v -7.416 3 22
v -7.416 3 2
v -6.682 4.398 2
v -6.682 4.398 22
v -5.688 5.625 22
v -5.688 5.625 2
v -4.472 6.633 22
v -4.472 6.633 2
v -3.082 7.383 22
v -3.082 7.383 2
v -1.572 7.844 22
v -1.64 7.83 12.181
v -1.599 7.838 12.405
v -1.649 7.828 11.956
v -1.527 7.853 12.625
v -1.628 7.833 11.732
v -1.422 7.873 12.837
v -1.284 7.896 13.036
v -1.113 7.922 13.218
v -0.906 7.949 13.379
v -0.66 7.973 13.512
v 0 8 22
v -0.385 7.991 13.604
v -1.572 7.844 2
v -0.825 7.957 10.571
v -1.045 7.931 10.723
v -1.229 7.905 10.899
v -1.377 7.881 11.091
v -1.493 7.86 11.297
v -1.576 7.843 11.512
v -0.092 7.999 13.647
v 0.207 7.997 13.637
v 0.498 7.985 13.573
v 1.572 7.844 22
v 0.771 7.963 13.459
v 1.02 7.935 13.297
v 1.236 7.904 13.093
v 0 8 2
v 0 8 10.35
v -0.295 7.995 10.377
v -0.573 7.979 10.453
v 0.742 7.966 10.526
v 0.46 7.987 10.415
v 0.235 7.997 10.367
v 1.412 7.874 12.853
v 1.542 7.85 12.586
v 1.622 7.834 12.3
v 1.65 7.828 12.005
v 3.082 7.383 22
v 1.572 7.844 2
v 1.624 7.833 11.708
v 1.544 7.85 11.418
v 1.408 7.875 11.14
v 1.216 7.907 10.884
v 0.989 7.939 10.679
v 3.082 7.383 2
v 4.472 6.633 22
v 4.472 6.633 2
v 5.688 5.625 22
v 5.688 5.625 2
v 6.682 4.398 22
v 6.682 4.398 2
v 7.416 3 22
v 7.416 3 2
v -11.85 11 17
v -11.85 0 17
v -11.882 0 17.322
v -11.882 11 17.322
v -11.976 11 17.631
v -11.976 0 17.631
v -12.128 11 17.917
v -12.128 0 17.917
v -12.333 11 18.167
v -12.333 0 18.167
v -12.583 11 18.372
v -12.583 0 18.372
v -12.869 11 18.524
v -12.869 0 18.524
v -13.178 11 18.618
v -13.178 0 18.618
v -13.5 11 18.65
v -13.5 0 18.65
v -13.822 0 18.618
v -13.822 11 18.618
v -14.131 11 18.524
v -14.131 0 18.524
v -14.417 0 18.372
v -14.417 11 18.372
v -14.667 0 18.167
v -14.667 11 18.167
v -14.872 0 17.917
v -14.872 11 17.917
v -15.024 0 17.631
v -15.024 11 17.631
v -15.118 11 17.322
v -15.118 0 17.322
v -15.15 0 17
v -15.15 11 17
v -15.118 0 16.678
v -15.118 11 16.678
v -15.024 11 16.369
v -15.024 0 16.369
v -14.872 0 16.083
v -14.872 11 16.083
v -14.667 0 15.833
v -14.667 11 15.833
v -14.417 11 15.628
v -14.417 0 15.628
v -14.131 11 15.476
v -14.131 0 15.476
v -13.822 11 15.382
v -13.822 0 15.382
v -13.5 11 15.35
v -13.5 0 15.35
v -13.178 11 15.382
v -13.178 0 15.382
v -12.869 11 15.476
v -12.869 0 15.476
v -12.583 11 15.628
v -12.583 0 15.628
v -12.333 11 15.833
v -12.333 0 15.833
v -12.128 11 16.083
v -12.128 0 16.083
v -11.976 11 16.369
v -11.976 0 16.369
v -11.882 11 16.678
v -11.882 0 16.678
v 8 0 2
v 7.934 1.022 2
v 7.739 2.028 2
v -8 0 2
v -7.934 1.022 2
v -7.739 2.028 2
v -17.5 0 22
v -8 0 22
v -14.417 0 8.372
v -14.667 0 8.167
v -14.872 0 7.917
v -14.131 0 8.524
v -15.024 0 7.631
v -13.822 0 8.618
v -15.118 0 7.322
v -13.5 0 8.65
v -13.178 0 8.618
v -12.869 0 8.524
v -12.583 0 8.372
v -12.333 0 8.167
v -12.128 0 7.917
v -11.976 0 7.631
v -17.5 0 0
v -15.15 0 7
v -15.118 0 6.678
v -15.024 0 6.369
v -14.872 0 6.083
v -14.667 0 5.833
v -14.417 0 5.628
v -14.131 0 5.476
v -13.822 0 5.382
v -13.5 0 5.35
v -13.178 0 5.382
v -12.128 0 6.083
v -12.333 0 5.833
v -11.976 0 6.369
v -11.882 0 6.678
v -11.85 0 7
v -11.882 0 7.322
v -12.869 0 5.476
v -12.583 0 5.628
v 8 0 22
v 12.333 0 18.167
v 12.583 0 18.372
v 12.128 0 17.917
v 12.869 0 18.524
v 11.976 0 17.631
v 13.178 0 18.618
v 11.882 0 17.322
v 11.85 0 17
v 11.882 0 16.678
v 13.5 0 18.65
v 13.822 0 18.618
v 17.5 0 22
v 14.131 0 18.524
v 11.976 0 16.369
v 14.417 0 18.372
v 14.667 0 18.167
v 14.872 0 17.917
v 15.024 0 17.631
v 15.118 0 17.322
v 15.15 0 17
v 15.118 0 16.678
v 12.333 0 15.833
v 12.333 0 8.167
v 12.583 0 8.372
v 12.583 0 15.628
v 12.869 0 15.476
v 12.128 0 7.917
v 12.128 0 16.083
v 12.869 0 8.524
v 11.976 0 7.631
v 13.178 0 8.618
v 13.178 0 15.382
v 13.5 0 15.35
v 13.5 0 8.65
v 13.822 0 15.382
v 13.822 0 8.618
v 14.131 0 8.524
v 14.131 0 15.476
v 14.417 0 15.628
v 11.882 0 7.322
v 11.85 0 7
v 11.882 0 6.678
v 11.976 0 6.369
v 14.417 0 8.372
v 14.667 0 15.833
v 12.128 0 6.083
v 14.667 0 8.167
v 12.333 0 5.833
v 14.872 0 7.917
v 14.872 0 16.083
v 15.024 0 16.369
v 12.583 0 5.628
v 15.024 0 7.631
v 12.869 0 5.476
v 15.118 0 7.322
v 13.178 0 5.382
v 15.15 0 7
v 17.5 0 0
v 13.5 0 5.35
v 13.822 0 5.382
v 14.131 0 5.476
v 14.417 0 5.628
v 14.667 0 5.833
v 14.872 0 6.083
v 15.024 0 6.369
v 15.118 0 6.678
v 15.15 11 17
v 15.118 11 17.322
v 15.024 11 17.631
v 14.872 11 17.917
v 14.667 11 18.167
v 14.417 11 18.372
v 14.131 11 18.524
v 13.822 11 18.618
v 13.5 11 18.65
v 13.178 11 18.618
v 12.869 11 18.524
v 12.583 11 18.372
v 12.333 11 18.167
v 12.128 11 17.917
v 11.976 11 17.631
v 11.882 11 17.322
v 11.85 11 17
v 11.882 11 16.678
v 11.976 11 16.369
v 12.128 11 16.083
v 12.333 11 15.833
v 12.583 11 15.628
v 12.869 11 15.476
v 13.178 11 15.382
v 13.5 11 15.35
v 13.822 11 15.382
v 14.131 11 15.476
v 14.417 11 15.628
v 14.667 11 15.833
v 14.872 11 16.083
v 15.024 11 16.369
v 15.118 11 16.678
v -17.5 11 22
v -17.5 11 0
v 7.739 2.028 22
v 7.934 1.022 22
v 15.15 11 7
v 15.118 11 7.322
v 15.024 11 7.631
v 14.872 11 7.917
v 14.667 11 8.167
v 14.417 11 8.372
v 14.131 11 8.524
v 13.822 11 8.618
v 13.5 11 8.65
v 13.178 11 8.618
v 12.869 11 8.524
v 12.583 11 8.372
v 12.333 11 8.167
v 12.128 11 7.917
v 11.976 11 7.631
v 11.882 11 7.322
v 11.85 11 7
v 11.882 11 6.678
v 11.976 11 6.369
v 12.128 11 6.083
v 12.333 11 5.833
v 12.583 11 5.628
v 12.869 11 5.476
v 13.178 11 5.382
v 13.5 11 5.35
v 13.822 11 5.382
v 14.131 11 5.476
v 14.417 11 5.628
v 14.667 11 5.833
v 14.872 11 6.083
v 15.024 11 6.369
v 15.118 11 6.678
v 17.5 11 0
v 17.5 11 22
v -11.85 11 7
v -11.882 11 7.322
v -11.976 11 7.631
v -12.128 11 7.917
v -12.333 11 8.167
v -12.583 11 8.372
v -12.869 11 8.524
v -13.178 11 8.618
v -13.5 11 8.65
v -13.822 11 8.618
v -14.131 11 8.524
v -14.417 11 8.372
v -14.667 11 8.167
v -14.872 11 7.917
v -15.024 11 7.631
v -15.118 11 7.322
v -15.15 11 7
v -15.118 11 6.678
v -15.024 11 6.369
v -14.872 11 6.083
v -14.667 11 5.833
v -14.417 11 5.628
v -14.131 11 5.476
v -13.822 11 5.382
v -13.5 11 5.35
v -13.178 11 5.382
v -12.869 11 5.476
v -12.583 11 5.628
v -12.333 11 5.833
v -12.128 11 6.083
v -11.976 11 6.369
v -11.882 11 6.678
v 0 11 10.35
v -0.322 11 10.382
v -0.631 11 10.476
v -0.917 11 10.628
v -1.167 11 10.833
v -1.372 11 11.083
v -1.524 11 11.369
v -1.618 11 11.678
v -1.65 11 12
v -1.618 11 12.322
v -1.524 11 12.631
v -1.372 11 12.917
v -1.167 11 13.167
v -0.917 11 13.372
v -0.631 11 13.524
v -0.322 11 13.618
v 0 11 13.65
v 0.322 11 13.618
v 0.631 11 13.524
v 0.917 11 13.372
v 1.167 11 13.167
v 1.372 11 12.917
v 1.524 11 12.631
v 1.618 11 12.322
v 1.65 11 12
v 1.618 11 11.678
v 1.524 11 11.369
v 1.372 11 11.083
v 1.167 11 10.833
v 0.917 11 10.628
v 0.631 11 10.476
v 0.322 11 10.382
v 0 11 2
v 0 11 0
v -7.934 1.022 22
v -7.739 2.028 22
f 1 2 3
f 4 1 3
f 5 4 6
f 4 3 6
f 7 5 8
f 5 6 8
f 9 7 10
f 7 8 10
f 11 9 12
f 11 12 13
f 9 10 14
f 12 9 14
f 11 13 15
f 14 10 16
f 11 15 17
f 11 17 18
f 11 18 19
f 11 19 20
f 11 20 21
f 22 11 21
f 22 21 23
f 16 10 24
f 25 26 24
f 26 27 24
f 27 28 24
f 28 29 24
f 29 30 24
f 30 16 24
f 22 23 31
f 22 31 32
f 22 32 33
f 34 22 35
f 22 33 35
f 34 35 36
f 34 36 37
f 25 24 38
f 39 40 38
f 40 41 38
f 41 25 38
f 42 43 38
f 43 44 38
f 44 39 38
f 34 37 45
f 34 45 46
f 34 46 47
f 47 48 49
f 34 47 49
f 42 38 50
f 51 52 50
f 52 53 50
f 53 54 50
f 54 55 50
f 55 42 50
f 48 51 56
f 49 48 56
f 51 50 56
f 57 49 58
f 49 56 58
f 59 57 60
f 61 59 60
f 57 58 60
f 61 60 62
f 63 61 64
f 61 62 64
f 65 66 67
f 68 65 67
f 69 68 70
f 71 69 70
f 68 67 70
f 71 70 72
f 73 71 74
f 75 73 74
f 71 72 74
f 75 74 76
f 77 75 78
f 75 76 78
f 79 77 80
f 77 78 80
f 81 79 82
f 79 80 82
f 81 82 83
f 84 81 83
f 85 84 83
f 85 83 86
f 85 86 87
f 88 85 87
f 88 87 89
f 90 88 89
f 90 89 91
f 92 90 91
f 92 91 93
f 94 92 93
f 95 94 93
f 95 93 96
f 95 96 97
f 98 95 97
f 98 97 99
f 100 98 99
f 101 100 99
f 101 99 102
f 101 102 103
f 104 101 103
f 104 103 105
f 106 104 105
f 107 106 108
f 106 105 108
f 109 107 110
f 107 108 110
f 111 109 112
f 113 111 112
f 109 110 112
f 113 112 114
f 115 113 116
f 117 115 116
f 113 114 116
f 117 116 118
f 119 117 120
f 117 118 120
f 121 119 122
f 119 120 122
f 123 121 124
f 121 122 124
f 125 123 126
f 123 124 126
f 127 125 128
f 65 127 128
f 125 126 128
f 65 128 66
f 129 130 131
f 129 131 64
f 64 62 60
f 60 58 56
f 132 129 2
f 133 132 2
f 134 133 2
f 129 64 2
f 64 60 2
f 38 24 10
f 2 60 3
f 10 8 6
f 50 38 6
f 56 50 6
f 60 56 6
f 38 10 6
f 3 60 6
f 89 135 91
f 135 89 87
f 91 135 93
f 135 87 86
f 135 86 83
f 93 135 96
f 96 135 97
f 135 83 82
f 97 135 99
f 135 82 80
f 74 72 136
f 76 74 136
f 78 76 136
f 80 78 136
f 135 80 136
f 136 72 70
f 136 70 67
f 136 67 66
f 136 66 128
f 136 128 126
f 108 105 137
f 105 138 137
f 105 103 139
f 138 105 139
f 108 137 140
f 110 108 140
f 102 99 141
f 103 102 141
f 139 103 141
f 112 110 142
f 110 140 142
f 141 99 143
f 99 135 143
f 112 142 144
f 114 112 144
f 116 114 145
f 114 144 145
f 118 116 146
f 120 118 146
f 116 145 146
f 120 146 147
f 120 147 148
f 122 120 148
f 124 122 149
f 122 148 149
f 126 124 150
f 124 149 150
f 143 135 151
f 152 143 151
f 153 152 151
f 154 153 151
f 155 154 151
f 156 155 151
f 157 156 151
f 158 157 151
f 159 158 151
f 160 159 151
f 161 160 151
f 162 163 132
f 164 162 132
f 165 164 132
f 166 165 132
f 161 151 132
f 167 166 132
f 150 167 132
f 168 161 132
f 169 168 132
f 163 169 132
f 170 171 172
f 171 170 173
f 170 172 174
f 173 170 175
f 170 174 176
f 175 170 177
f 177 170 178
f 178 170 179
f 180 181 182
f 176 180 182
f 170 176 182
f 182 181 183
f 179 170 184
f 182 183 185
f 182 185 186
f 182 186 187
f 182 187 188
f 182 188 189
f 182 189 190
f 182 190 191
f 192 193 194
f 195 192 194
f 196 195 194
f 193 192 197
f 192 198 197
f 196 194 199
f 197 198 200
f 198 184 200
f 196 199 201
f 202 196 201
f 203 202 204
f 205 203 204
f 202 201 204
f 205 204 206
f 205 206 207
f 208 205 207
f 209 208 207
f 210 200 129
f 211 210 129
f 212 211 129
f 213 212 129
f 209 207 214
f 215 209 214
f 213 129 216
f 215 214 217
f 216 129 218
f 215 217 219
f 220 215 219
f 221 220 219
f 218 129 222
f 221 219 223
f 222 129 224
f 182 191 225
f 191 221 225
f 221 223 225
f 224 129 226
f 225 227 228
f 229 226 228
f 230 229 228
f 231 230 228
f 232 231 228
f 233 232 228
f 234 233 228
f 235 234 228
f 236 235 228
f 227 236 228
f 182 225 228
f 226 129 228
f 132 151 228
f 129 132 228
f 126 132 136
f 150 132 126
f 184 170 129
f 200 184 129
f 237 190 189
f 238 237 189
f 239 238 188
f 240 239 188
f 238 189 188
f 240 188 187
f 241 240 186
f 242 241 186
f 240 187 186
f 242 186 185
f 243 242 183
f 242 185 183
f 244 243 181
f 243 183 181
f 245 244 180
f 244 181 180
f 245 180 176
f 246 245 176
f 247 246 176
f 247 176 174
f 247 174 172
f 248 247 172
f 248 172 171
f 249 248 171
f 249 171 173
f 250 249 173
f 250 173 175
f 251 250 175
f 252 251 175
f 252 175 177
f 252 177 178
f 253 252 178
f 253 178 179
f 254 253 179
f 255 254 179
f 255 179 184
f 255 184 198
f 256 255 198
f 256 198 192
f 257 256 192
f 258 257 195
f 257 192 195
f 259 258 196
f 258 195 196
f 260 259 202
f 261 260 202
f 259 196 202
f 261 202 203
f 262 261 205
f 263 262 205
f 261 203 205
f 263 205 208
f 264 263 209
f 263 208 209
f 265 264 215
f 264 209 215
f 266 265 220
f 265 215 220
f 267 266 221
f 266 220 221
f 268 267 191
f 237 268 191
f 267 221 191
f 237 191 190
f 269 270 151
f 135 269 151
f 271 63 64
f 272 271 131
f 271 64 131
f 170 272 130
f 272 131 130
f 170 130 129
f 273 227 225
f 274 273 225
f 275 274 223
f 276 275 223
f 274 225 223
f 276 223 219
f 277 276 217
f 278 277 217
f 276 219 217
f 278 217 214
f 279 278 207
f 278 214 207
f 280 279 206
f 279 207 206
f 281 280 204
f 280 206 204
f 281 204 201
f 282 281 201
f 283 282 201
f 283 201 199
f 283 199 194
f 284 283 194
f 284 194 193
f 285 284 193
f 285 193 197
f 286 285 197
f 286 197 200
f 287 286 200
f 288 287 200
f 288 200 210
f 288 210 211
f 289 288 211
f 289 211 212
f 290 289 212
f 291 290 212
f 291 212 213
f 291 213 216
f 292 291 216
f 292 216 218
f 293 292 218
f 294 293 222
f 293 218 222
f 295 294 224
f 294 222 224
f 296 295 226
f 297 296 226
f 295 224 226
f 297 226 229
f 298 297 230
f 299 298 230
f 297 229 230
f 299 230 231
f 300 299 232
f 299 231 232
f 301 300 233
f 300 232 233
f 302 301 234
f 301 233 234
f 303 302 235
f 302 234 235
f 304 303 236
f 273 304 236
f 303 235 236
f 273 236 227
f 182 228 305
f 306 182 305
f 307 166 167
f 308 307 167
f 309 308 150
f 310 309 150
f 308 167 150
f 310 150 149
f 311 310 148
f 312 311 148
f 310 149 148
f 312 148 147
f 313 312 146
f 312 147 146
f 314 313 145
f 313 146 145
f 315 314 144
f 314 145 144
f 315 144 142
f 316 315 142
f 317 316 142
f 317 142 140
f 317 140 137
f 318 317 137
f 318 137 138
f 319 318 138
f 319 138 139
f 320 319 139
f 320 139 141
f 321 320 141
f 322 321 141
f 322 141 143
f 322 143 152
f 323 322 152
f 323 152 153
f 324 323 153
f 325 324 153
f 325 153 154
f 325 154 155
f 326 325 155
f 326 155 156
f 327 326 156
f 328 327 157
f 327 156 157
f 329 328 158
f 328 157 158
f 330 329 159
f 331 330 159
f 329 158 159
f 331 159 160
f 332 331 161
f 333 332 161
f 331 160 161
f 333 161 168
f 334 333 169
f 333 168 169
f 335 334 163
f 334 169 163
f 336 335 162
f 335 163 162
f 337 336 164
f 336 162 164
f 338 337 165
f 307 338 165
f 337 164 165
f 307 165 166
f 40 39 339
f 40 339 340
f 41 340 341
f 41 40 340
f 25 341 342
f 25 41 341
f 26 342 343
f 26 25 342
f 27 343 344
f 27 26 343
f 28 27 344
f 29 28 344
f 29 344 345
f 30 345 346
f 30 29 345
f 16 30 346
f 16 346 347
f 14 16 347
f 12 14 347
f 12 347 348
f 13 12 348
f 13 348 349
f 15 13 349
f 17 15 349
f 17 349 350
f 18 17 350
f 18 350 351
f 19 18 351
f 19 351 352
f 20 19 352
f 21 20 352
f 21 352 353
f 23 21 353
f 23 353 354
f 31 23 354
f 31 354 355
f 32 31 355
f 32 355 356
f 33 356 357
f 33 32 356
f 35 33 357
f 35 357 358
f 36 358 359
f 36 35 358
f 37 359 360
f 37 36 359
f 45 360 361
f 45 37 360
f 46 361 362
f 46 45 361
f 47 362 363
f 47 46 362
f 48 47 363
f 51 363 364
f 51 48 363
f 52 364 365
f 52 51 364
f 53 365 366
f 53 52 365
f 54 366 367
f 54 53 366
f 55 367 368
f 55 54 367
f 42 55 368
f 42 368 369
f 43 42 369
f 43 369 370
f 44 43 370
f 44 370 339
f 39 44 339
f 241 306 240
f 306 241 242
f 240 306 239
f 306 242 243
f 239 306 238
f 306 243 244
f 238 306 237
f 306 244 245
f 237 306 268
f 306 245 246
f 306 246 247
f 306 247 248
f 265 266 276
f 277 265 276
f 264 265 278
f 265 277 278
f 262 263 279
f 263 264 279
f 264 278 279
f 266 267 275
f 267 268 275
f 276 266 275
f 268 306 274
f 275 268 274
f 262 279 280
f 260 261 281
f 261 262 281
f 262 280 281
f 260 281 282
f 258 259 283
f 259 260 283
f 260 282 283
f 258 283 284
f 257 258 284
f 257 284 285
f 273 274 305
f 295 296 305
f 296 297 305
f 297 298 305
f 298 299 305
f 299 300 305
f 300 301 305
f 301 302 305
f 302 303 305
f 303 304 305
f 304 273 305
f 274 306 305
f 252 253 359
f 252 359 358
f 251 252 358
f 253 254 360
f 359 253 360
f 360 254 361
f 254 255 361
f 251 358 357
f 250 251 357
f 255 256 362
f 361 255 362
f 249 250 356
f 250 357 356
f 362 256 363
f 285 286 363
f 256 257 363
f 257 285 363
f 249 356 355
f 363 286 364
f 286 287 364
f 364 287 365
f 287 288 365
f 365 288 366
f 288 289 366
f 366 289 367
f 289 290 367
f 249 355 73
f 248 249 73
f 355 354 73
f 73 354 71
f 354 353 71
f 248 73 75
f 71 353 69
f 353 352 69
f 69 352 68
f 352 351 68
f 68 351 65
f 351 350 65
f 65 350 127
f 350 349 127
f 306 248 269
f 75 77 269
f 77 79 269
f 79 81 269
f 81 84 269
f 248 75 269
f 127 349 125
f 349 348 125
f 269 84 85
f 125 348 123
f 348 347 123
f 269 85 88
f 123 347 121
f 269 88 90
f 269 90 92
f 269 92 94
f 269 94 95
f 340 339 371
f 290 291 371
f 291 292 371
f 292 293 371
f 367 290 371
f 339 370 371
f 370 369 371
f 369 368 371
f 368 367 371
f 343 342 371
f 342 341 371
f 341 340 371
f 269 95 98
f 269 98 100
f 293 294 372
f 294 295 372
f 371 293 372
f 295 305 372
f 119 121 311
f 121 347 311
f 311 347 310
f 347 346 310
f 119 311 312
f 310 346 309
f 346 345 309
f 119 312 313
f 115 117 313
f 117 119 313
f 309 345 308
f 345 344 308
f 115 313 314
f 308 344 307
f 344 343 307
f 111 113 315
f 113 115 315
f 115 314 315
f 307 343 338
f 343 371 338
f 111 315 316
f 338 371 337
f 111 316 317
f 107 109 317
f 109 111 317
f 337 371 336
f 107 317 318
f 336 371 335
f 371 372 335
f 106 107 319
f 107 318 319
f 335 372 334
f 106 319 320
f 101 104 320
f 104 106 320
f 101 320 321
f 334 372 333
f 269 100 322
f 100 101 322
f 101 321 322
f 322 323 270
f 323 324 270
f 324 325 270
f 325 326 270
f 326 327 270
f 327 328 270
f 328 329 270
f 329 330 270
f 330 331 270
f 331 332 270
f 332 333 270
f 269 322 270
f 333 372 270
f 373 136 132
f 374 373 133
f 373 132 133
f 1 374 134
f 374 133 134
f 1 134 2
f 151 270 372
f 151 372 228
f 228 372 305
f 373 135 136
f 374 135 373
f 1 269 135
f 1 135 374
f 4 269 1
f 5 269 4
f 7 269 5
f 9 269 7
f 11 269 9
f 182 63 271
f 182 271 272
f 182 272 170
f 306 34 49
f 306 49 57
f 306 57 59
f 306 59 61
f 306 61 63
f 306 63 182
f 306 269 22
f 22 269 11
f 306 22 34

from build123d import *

# Parameters (mm, degrees)
EXTRUDE_1_DEPTH     = 22
SKETCH_3_R          = 1.65
CUT_EXTRUDE_2_DEPTH = 19
EXTRUDE_2_DEPTH     = 2
SKETCH_5_R          = 1.65
CUT_EXTRUDE_3_DEPTH = 31.186917806


with BuildPart() as part:
    # 草图1 → 凸台-拉伸1 (new body)
    with BuildSketch(Plane.XY):
        with BuildLine():
            Line((-10.583005244, 3), (-17.5, 3))
            Line((-17.5, 3), (-17.5, 0))
            Line((-17.5, 0), (-11, 0))
            ThreePointArc((-11, 0), (-10.895252583, 1.514421063), (-10.583005244, 3))
        make_face()
        with BuildLine():
            Line((-7.416198487, 3), (-10.583005244, 3))
            ThreePointArc((-10.583005244, 3), (-10.895252583, 1.514421063), (-11, 0))
            Line((-11, 0), (-8, 0))
            ThreePointArc((-8, 0), (-7.85269342, 1.5281381), (-7.416198487, 3))
        make_face()
        with BuildLine():
            ThreePointArc((11, 0), (10.895252583, 1.514421063), (10.583005244, 3))
            Line((10.583005244, 3), (7.416198487, 3))
            ThreePointArc((7.416198487, 3), (7.85269342, 1.5281381), (8, 0))
            Line((8, 0), (11, 0))
        make_face()
        with BuildLine():
            ThreePointArc((-4.5e-08, 11), (-6.633249599, 8.774964374), (-10.583005244, 3))
            Line((-10.583005244, 3), (-7.416198487, 3))
            ThreePointArc((-7.416198487, 3), (0, 8), (7.416198487, 3))
            Line((7.416198487, 3), (10.583005244, 3))
            ThreePointArc((10.583005244, 3), (6.633249563, 8.774964401), (-4.5e-08, 11))
        make_face()
        with BuildLine():
            Line((17.5, 3), (10.583005244, 3))
            ThreePointArc((10.583005244, 3), (10.895252583, 1.514421063), (11, 0))
            Line((11, 0), (17.5, 0))
            Line((17.5, 0), (17.5, 3))
        make_face()
        with BuildLine():
            Line((-17.5, 11), (-17.5, 3))
            Line((-17.5, 3), (-10.583005244, 3))
            ThreePointArc((-10.583005244, 3), (-6.633249599, 8.774964374), (-4.5e-08, 11))
            Line((-4.5e-08, 11), (-17.5, 11))
        make_face()
        with BuildLine():
            Line((17.5, 11), (-4.5e-08, 11))
            ThreePointArc((-4.5e-08, 11), (6.633249563, 8.774964401), (10.583005244, 3))
            Line((10.583005244, 3), (17.5, 3))
            Line((17.5, 3), (17.5, 11))
        make_face()
    extrude(amount=EXTRUDE_1_DEPTH)

    # 草图3 → 切除-拉伸2 (cut)
    with BuildSketch(Plane(origin=(0, 0, 0), x_dir=(1, 0, 0), z_dir=(0, 1, 0))):
        with Locations(Location((0, -12, 0), (0, 0, 90))):
            Circle(SKETCH_3_R)
    extrude(amount=CUT_EXTRUDE_2_DEPTH, mode=Mode.SUBTRACT)

    # 草图4 → 凸台-拉伸2 (add)
    with BuildSketch(Plane(origin=(0, 0, 0), x_dir=(-1, 0, 0), z_dir=(0, 0, -1))):
        with BuildLine():
            Line((-11, 0), (11, 0))
            ThreePointArc((11, 0), (0, 11), (-11, 0))
        make_face()
    extrude(amount=-EXTRUDE_2_DEPTH)

    # 草图5 → 切除-拉伸3 (cut, through all)
    with BuildSketch(Plane.XZ):
        with Locations((-13.5, 17)):
            Circle(SKETCH_5_R)
        with Locations((-13.5, 7)):
            Circle(SKETCH_5_R)
        with Locations((13.5, 17)):
            Circle(SKETCH_5_R)
        with Locations((13.5, 7)):
            Circle(SKETCH_5_R)
    extrude(amount=-CUT_EXTRUDE_3_DEPTH, mode=Mode.SUBTRACT)


solid = part.part
